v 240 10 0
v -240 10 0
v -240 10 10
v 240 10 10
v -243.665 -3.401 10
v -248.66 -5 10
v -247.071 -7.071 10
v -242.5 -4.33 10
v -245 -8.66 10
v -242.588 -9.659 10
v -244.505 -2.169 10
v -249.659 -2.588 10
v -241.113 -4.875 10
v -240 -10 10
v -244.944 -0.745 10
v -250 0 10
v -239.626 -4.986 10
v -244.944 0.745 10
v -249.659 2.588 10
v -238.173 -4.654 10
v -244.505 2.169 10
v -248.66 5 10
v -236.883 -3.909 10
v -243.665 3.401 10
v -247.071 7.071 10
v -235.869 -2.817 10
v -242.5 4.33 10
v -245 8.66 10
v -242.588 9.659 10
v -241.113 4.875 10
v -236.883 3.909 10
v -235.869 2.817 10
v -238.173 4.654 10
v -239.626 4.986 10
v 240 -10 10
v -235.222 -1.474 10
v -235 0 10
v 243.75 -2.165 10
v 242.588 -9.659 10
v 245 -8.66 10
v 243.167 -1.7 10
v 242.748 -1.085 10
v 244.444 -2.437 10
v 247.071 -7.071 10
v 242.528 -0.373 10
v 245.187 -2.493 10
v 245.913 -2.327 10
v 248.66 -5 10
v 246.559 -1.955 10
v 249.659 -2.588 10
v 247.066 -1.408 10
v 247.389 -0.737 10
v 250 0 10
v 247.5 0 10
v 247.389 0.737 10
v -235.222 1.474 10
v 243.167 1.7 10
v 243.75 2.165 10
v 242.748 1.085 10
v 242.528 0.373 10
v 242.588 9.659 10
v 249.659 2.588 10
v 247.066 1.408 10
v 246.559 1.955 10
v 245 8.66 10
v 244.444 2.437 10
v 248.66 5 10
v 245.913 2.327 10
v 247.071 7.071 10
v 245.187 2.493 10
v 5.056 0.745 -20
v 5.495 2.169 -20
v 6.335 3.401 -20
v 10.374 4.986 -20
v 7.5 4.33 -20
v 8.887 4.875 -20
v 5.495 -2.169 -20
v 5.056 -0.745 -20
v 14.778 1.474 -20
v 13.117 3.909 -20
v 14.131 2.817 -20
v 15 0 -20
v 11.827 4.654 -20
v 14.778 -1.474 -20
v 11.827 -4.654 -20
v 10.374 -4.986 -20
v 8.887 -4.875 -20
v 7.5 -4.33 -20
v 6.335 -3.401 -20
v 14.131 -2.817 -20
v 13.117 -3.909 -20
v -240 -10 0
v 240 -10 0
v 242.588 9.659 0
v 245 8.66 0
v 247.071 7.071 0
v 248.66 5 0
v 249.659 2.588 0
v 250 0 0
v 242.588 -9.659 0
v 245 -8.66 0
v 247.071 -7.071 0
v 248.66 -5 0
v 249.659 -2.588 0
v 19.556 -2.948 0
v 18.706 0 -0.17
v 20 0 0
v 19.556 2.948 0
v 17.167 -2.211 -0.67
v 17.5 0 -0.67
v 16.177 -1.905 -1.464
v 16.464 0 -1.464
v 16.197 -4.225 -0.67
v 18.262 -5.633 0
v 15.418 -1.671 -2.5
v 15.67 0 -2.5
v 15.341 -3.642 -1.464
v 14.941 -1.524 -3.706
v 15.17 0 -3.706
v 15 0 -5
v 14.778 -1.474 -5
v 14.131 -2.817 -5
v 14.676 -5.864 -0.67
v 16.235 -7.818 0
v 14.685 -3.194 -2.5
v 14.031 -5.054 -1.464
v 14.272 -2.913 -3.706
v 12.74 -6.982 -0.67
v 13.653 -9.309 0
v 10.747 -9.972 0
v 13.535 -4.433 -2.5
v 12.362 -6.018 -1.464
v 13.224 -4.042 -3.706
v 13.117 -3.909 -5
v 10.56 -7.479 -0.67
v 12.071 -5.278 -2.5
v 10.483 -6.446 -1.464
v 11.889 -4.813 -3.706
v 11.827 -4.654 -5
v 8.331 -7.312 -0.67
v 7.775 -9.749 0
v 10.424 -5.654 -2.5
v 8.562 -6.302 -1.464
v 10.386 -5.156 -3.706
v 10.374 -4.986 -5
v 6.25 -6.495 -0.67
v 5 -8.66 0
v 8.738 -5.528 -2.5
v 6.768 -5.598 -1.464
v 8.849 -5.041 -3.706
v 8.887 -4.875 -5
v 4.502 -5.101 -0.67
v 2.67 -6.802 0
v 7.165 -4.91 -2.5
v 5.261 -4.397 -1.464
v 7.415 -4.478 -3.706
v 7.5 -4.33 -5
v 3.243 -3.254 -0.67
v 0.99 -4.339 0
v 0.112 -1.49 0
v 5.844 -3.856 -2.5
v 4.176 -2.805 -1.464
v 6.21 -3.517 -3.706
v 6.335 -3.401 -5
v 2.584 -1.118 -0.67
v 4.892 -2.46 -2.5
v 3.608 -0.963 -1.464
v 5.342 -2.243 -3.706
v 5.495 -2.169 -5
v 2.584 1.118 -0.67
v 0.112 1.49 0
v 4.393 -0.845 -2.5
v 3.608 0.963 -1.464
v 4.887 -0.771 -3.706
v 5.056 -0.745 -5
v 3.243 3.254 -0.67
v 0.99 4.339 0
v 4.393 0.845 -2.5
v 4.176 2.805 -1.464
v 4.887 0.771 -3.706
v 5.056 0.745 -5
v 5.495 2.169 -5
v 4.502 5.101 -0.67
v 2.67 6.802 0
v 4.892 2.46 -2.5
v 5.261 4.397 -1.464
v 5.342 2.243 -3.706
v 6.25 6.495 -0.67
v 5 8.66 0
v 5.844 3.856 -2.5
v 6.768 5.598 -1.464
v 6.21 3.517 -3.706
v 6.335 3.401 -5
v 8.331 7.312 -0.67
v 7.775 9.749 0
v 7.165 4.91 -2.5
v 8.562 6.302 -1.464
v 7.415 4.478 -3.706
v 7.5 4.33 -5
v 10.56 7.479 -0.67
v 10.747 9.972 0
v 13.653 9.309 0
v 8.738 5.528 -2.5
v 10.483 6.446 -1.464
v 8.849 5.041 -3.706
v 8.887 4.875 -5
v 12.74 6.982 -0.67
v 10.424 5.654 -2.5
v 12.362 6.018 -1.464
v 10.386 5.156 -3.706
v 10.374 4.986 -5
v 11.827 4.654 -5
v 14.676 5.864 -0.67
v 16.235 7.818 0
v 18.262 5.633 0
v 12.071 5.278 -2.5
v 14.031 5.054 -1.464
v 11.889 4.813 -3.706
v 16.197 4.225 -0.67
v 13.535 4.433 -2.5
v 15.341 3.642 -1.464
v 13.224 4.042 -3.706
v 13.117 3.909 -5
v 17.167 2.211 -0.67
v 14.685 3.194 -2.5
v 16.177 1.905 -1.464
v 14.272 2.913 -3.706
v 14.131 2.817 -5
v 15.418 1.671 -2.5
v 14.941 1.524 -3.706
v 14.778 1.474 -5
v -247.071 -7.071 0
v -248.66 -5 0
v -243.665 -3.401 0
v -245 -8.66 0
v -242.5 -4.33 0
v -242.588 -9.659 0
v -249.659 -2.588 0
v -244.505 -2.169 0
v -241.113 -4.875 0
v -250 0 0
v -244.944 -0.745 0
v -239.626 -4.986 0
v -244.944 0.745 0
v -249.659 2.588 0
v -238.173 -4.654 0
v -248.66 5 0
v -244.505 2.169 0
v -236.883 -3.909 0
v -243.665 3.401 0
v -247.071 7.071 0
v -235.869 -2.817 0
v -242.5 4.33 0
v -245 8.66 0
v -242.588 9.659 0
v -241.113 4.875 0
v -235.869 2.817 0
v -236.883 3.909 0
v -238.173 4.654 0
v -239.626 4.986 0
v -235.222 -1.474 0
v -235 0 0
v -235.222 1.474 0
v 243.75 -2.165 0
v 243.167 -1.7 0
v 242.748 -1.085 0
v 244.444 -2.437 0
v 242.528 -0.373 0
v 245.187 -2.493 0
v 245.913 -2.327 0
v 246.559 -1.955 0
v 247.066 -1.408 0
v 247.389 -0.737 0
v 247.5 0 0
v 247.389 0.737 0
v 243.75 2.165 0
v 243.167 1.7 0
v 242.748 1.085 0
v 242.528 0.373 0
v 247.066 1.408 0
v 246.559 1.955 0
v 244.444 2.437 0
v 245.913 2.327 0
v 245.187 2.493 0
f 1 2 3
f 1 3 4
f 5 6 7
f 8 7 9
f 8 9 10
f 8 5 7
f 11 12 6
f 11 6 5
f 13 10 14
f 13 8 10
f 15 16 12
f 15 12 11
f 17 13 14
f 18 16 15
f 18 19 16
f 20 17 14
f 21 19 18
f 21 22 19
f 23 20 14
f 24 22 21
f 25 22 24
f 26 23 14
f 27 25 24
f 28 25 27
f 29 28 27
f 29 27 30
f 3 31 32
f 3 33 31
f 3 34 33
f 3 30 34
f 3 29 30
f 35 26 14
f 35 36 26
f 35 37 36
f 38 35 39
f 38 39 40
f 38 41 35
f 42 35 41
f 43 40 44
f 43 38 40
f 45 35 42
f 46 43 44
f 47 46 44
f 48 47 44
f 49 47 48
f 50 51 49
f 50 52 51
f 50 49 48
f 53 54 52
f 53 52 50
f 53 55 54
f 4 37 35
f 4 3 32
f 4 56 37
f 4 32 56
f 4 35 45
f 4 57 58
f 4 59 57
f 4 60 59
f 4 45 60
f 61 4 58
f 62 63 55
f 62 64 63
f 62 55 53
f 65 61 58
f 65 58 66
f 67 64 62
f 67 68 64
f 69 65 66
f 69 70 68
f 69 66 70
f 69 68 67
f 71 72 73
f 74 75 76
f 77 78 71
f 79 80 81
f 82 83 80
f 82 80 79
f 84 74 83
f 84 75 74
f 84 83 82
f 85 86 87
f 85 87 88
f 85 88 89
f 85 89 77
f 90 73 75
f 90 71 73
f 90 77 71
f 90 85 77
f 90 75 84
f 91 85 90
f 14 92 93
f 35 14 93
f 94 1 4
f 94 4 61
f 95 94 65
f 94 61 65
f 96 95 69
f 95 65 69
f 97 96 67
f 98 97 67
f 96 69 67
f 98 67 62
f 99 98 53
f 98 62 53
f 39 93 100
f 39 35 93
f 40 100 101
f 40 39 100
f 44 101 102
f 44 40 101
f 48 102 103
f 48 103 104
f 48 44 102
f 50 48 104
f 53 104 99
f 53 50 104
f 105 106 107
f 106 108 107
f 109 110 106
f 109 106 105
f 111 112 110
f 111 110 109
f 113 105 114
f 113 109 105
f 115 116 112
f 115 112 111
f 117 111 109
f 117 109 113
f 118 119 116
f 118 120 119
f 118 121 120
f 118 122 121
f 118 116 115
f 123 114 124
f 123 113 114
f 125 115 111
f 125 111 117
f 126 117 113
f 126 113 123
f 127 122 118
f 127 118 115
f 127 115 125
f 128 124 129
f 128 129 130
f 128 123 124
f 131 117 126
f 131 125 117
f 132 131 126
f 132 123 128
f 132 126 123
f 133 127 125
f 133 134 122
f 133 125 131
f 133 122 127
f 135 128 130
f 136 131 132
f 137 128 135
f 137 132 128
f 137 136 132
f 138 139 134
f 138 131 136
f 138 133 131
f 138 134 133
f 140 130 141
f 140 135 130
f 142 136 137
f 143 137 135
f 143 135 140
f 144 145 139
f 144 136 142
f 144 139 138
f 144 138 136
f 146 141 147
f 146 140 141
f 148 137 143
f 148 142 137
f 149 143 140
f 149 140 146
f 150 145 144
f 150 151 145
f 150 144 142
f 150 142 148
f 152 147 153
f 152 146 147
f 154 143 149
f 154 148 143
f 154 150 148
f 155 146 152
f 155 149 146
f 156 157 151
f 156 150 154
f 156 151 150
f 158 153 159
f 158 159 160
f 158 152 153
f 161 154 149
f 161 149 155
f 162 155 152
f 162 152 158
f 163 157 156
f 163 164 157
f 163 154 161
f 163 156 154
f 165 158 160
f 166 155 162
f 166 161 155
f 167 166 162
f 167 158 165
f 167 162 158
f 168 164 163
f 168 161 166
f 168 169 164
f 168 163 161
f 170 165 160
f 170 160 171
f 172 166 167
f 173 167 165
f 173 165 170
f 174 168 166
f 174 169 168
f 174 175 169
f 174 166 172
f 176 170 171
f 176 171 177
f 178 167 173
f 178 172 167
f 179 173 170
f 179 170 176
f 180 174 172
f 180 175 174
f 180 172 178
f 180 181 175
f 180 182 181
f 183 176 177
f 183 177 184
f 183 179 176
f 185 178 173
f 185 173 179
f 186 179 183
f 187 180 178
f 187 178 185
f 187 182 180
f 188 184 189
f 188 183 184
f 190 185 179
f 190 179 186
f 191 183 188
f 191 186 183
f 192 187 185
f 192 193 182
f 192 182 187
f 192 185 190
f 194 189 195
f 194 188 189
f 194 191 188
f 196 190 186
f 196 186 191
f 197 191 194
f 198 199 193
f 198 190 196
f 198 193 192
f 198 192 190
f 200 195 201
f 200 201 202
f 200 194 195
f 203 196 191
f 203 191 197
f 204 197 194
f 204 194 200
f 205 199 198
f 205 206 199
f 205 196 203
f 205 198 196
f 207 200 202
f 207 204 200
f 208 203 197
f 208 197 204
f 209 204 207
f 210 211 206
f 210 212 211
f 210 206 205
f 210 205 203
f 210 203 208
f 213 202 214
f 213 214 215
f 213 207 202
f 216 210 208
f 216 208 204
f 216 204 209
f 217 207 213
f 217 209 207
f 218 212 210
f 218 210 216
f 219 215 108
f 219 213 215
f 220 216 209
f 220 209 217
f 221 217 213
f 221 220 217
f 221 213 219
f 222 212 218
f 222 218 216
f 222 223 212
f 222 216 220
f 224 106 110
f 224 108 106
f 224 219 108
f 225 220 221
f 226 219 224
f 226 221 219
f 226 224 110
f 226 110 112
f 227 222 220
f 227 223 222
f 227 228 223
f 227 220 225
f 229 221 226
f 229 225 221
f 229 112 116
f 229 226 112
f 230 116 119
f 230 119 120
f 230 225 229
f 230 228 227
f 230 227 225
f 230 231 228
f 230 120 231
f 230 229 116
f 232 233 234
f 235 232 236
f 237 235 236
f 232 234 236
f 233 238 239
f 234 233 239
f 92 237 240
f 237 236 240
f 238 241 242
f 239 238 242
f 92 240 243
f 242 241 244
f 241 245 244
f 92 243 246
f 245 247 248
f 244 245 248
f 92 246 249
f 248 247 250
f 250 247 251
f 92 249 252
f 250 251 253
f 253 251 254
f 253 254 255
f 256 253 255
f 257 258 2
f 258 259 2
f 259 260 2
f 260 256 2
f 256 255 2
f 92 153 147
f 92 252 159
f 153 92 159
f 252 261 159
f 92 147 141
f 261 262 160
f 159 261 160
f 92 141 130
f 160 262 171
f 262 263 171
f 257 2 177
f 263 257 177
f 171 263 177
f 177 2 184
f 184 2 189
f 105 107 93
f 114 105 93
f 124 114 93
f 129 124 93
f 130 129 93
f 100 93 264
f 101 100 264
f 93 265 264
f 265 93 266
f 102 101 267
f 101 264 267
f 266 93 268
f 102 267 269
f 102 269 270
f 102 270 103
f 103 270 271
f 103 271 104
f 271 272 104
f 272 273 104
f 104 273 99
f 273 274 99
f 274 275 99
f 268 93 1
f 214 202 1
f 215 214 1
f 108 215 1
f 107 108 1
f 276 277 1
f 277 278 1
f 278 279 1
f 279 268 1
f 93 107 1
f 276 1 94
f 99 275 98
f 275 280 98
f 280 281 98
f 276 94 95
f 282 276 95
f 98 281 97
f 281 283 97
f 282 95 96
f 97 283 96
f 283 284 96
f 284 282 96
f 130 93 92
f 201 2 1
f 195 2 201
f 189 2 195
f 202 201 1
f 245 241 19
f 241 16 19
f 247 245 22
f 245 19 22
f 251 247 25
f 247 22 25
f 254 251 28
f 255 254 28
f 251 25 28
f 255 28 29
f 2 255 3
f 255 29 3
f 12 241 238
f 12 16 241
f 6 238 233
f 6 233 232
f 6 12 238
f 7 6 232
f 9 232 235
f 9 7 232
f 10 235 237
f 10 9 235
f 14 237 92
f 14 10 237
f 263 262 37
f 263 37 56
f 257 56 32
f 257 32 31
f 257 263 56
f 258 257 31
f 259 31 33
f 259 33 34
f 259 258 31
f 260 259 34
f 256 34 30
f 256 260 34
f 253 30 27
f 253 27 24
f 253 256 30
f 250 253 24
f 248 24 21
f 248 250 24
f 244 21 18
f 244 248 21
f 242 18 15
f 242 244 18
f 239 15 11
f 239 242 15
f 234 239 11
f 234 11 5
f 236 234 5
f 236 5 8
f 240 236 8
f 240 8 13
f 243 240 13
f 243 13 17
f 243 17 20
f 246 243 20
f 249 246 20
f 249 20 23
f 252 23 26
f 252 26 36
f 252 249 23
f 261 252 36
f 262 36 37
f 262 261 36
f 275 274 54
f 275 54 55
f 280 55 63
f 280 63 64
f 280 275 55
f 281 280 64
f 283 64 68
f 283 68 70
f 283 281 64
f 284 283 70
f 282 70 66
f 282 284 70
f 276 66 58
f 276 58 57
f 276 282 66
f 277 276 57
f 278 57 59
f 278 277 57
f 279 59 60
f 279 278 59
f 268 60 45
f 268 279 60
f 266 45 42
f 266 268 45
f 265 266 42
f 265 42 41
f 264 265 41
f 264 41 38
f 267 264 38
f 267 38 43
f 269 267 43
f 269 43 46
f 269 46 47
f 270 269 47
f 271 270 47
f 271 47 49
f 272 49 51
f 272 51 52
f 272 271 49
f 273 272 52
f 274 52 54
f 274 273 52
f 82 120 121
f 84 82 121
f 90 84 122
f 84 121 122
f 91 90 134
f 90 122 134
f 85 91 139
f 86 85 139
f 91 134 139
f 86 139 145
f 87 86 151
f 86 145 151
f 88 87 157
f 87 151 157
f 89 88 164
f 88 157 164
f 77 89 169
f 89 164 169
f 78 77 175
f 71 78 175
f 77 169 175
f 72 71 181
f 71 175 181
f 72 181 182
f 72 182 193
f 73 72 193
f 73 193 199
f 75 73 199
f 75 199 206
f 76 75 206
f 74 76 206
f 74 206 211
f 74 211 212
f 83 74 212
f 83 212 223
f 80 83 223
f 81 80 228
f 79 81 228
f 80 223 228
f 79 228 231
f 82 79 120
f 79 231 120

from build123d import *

# Parameters (mm, degrees)
SKETCH1_W           = 500
SKETCH1_H           = 20
SKETCH1_R           = 5
SKETCH1_R_2         = 2.5
BOSS_EXTRUDE1_DEPTH = 10
FILLET1_R           = 10
SKETCH2_R           = 5
BOSS_EXTRUDE2_DEPTH = 20
FILLET2_R           = 5


with BuildPart() as part:
    # Sketch1 → Boss-Extrude1 (new body)
    with BuildSketch(Plane.XY):
        Rectangle(SKETCH1_W, SKETCH1_H)
        with Locations((-240, 0)):
            Circle(SKETCH1_R, mode=Mode.SUBTRACT)
        with Locations((245, 0)):
            Circle(SKETCH1_R_2, mode=Mode.SUBTRACT)
    extrude(amount=BOSS_EXTRUDE1_DEPTH)

    # Fillet1
    fillet1_edges = [part.edges().sort_by_distance(p)[0] for p in [
        (250, -10, 5),
        (250, 10, 5),
        (-250, -10, 5),
        (-250, 10, 5),
    ]]
    fillet(fillet1_edges, radius=FILLET1_R - 0.0001)  # a hair under: the kernel refuses the full size

    # Sketch2 → Boss-Extrude2 (add)
    with BuildSketch(Plane(origin=(0, 0, 0), x_dir=(-1, 0, 0), z_dir=(0, 0, -1))):
        with Locations(Location((-10, 0, 0), (0, 0, 180))):
            Circle(SKETCH2_R)
    extrude(amount=BOSS_EXTRUDE2_DEPTH)

    # Fillet2
    fillet2_edges = [part.edges().sort_by_distance(p)[0] for p in [
        (5, 0, 0),
    ]]
    fillet(fillet2_edges, radius=FILLET2_R - 0.0001)  # a hair under: the kernel refuses the full size


solid = part.part
